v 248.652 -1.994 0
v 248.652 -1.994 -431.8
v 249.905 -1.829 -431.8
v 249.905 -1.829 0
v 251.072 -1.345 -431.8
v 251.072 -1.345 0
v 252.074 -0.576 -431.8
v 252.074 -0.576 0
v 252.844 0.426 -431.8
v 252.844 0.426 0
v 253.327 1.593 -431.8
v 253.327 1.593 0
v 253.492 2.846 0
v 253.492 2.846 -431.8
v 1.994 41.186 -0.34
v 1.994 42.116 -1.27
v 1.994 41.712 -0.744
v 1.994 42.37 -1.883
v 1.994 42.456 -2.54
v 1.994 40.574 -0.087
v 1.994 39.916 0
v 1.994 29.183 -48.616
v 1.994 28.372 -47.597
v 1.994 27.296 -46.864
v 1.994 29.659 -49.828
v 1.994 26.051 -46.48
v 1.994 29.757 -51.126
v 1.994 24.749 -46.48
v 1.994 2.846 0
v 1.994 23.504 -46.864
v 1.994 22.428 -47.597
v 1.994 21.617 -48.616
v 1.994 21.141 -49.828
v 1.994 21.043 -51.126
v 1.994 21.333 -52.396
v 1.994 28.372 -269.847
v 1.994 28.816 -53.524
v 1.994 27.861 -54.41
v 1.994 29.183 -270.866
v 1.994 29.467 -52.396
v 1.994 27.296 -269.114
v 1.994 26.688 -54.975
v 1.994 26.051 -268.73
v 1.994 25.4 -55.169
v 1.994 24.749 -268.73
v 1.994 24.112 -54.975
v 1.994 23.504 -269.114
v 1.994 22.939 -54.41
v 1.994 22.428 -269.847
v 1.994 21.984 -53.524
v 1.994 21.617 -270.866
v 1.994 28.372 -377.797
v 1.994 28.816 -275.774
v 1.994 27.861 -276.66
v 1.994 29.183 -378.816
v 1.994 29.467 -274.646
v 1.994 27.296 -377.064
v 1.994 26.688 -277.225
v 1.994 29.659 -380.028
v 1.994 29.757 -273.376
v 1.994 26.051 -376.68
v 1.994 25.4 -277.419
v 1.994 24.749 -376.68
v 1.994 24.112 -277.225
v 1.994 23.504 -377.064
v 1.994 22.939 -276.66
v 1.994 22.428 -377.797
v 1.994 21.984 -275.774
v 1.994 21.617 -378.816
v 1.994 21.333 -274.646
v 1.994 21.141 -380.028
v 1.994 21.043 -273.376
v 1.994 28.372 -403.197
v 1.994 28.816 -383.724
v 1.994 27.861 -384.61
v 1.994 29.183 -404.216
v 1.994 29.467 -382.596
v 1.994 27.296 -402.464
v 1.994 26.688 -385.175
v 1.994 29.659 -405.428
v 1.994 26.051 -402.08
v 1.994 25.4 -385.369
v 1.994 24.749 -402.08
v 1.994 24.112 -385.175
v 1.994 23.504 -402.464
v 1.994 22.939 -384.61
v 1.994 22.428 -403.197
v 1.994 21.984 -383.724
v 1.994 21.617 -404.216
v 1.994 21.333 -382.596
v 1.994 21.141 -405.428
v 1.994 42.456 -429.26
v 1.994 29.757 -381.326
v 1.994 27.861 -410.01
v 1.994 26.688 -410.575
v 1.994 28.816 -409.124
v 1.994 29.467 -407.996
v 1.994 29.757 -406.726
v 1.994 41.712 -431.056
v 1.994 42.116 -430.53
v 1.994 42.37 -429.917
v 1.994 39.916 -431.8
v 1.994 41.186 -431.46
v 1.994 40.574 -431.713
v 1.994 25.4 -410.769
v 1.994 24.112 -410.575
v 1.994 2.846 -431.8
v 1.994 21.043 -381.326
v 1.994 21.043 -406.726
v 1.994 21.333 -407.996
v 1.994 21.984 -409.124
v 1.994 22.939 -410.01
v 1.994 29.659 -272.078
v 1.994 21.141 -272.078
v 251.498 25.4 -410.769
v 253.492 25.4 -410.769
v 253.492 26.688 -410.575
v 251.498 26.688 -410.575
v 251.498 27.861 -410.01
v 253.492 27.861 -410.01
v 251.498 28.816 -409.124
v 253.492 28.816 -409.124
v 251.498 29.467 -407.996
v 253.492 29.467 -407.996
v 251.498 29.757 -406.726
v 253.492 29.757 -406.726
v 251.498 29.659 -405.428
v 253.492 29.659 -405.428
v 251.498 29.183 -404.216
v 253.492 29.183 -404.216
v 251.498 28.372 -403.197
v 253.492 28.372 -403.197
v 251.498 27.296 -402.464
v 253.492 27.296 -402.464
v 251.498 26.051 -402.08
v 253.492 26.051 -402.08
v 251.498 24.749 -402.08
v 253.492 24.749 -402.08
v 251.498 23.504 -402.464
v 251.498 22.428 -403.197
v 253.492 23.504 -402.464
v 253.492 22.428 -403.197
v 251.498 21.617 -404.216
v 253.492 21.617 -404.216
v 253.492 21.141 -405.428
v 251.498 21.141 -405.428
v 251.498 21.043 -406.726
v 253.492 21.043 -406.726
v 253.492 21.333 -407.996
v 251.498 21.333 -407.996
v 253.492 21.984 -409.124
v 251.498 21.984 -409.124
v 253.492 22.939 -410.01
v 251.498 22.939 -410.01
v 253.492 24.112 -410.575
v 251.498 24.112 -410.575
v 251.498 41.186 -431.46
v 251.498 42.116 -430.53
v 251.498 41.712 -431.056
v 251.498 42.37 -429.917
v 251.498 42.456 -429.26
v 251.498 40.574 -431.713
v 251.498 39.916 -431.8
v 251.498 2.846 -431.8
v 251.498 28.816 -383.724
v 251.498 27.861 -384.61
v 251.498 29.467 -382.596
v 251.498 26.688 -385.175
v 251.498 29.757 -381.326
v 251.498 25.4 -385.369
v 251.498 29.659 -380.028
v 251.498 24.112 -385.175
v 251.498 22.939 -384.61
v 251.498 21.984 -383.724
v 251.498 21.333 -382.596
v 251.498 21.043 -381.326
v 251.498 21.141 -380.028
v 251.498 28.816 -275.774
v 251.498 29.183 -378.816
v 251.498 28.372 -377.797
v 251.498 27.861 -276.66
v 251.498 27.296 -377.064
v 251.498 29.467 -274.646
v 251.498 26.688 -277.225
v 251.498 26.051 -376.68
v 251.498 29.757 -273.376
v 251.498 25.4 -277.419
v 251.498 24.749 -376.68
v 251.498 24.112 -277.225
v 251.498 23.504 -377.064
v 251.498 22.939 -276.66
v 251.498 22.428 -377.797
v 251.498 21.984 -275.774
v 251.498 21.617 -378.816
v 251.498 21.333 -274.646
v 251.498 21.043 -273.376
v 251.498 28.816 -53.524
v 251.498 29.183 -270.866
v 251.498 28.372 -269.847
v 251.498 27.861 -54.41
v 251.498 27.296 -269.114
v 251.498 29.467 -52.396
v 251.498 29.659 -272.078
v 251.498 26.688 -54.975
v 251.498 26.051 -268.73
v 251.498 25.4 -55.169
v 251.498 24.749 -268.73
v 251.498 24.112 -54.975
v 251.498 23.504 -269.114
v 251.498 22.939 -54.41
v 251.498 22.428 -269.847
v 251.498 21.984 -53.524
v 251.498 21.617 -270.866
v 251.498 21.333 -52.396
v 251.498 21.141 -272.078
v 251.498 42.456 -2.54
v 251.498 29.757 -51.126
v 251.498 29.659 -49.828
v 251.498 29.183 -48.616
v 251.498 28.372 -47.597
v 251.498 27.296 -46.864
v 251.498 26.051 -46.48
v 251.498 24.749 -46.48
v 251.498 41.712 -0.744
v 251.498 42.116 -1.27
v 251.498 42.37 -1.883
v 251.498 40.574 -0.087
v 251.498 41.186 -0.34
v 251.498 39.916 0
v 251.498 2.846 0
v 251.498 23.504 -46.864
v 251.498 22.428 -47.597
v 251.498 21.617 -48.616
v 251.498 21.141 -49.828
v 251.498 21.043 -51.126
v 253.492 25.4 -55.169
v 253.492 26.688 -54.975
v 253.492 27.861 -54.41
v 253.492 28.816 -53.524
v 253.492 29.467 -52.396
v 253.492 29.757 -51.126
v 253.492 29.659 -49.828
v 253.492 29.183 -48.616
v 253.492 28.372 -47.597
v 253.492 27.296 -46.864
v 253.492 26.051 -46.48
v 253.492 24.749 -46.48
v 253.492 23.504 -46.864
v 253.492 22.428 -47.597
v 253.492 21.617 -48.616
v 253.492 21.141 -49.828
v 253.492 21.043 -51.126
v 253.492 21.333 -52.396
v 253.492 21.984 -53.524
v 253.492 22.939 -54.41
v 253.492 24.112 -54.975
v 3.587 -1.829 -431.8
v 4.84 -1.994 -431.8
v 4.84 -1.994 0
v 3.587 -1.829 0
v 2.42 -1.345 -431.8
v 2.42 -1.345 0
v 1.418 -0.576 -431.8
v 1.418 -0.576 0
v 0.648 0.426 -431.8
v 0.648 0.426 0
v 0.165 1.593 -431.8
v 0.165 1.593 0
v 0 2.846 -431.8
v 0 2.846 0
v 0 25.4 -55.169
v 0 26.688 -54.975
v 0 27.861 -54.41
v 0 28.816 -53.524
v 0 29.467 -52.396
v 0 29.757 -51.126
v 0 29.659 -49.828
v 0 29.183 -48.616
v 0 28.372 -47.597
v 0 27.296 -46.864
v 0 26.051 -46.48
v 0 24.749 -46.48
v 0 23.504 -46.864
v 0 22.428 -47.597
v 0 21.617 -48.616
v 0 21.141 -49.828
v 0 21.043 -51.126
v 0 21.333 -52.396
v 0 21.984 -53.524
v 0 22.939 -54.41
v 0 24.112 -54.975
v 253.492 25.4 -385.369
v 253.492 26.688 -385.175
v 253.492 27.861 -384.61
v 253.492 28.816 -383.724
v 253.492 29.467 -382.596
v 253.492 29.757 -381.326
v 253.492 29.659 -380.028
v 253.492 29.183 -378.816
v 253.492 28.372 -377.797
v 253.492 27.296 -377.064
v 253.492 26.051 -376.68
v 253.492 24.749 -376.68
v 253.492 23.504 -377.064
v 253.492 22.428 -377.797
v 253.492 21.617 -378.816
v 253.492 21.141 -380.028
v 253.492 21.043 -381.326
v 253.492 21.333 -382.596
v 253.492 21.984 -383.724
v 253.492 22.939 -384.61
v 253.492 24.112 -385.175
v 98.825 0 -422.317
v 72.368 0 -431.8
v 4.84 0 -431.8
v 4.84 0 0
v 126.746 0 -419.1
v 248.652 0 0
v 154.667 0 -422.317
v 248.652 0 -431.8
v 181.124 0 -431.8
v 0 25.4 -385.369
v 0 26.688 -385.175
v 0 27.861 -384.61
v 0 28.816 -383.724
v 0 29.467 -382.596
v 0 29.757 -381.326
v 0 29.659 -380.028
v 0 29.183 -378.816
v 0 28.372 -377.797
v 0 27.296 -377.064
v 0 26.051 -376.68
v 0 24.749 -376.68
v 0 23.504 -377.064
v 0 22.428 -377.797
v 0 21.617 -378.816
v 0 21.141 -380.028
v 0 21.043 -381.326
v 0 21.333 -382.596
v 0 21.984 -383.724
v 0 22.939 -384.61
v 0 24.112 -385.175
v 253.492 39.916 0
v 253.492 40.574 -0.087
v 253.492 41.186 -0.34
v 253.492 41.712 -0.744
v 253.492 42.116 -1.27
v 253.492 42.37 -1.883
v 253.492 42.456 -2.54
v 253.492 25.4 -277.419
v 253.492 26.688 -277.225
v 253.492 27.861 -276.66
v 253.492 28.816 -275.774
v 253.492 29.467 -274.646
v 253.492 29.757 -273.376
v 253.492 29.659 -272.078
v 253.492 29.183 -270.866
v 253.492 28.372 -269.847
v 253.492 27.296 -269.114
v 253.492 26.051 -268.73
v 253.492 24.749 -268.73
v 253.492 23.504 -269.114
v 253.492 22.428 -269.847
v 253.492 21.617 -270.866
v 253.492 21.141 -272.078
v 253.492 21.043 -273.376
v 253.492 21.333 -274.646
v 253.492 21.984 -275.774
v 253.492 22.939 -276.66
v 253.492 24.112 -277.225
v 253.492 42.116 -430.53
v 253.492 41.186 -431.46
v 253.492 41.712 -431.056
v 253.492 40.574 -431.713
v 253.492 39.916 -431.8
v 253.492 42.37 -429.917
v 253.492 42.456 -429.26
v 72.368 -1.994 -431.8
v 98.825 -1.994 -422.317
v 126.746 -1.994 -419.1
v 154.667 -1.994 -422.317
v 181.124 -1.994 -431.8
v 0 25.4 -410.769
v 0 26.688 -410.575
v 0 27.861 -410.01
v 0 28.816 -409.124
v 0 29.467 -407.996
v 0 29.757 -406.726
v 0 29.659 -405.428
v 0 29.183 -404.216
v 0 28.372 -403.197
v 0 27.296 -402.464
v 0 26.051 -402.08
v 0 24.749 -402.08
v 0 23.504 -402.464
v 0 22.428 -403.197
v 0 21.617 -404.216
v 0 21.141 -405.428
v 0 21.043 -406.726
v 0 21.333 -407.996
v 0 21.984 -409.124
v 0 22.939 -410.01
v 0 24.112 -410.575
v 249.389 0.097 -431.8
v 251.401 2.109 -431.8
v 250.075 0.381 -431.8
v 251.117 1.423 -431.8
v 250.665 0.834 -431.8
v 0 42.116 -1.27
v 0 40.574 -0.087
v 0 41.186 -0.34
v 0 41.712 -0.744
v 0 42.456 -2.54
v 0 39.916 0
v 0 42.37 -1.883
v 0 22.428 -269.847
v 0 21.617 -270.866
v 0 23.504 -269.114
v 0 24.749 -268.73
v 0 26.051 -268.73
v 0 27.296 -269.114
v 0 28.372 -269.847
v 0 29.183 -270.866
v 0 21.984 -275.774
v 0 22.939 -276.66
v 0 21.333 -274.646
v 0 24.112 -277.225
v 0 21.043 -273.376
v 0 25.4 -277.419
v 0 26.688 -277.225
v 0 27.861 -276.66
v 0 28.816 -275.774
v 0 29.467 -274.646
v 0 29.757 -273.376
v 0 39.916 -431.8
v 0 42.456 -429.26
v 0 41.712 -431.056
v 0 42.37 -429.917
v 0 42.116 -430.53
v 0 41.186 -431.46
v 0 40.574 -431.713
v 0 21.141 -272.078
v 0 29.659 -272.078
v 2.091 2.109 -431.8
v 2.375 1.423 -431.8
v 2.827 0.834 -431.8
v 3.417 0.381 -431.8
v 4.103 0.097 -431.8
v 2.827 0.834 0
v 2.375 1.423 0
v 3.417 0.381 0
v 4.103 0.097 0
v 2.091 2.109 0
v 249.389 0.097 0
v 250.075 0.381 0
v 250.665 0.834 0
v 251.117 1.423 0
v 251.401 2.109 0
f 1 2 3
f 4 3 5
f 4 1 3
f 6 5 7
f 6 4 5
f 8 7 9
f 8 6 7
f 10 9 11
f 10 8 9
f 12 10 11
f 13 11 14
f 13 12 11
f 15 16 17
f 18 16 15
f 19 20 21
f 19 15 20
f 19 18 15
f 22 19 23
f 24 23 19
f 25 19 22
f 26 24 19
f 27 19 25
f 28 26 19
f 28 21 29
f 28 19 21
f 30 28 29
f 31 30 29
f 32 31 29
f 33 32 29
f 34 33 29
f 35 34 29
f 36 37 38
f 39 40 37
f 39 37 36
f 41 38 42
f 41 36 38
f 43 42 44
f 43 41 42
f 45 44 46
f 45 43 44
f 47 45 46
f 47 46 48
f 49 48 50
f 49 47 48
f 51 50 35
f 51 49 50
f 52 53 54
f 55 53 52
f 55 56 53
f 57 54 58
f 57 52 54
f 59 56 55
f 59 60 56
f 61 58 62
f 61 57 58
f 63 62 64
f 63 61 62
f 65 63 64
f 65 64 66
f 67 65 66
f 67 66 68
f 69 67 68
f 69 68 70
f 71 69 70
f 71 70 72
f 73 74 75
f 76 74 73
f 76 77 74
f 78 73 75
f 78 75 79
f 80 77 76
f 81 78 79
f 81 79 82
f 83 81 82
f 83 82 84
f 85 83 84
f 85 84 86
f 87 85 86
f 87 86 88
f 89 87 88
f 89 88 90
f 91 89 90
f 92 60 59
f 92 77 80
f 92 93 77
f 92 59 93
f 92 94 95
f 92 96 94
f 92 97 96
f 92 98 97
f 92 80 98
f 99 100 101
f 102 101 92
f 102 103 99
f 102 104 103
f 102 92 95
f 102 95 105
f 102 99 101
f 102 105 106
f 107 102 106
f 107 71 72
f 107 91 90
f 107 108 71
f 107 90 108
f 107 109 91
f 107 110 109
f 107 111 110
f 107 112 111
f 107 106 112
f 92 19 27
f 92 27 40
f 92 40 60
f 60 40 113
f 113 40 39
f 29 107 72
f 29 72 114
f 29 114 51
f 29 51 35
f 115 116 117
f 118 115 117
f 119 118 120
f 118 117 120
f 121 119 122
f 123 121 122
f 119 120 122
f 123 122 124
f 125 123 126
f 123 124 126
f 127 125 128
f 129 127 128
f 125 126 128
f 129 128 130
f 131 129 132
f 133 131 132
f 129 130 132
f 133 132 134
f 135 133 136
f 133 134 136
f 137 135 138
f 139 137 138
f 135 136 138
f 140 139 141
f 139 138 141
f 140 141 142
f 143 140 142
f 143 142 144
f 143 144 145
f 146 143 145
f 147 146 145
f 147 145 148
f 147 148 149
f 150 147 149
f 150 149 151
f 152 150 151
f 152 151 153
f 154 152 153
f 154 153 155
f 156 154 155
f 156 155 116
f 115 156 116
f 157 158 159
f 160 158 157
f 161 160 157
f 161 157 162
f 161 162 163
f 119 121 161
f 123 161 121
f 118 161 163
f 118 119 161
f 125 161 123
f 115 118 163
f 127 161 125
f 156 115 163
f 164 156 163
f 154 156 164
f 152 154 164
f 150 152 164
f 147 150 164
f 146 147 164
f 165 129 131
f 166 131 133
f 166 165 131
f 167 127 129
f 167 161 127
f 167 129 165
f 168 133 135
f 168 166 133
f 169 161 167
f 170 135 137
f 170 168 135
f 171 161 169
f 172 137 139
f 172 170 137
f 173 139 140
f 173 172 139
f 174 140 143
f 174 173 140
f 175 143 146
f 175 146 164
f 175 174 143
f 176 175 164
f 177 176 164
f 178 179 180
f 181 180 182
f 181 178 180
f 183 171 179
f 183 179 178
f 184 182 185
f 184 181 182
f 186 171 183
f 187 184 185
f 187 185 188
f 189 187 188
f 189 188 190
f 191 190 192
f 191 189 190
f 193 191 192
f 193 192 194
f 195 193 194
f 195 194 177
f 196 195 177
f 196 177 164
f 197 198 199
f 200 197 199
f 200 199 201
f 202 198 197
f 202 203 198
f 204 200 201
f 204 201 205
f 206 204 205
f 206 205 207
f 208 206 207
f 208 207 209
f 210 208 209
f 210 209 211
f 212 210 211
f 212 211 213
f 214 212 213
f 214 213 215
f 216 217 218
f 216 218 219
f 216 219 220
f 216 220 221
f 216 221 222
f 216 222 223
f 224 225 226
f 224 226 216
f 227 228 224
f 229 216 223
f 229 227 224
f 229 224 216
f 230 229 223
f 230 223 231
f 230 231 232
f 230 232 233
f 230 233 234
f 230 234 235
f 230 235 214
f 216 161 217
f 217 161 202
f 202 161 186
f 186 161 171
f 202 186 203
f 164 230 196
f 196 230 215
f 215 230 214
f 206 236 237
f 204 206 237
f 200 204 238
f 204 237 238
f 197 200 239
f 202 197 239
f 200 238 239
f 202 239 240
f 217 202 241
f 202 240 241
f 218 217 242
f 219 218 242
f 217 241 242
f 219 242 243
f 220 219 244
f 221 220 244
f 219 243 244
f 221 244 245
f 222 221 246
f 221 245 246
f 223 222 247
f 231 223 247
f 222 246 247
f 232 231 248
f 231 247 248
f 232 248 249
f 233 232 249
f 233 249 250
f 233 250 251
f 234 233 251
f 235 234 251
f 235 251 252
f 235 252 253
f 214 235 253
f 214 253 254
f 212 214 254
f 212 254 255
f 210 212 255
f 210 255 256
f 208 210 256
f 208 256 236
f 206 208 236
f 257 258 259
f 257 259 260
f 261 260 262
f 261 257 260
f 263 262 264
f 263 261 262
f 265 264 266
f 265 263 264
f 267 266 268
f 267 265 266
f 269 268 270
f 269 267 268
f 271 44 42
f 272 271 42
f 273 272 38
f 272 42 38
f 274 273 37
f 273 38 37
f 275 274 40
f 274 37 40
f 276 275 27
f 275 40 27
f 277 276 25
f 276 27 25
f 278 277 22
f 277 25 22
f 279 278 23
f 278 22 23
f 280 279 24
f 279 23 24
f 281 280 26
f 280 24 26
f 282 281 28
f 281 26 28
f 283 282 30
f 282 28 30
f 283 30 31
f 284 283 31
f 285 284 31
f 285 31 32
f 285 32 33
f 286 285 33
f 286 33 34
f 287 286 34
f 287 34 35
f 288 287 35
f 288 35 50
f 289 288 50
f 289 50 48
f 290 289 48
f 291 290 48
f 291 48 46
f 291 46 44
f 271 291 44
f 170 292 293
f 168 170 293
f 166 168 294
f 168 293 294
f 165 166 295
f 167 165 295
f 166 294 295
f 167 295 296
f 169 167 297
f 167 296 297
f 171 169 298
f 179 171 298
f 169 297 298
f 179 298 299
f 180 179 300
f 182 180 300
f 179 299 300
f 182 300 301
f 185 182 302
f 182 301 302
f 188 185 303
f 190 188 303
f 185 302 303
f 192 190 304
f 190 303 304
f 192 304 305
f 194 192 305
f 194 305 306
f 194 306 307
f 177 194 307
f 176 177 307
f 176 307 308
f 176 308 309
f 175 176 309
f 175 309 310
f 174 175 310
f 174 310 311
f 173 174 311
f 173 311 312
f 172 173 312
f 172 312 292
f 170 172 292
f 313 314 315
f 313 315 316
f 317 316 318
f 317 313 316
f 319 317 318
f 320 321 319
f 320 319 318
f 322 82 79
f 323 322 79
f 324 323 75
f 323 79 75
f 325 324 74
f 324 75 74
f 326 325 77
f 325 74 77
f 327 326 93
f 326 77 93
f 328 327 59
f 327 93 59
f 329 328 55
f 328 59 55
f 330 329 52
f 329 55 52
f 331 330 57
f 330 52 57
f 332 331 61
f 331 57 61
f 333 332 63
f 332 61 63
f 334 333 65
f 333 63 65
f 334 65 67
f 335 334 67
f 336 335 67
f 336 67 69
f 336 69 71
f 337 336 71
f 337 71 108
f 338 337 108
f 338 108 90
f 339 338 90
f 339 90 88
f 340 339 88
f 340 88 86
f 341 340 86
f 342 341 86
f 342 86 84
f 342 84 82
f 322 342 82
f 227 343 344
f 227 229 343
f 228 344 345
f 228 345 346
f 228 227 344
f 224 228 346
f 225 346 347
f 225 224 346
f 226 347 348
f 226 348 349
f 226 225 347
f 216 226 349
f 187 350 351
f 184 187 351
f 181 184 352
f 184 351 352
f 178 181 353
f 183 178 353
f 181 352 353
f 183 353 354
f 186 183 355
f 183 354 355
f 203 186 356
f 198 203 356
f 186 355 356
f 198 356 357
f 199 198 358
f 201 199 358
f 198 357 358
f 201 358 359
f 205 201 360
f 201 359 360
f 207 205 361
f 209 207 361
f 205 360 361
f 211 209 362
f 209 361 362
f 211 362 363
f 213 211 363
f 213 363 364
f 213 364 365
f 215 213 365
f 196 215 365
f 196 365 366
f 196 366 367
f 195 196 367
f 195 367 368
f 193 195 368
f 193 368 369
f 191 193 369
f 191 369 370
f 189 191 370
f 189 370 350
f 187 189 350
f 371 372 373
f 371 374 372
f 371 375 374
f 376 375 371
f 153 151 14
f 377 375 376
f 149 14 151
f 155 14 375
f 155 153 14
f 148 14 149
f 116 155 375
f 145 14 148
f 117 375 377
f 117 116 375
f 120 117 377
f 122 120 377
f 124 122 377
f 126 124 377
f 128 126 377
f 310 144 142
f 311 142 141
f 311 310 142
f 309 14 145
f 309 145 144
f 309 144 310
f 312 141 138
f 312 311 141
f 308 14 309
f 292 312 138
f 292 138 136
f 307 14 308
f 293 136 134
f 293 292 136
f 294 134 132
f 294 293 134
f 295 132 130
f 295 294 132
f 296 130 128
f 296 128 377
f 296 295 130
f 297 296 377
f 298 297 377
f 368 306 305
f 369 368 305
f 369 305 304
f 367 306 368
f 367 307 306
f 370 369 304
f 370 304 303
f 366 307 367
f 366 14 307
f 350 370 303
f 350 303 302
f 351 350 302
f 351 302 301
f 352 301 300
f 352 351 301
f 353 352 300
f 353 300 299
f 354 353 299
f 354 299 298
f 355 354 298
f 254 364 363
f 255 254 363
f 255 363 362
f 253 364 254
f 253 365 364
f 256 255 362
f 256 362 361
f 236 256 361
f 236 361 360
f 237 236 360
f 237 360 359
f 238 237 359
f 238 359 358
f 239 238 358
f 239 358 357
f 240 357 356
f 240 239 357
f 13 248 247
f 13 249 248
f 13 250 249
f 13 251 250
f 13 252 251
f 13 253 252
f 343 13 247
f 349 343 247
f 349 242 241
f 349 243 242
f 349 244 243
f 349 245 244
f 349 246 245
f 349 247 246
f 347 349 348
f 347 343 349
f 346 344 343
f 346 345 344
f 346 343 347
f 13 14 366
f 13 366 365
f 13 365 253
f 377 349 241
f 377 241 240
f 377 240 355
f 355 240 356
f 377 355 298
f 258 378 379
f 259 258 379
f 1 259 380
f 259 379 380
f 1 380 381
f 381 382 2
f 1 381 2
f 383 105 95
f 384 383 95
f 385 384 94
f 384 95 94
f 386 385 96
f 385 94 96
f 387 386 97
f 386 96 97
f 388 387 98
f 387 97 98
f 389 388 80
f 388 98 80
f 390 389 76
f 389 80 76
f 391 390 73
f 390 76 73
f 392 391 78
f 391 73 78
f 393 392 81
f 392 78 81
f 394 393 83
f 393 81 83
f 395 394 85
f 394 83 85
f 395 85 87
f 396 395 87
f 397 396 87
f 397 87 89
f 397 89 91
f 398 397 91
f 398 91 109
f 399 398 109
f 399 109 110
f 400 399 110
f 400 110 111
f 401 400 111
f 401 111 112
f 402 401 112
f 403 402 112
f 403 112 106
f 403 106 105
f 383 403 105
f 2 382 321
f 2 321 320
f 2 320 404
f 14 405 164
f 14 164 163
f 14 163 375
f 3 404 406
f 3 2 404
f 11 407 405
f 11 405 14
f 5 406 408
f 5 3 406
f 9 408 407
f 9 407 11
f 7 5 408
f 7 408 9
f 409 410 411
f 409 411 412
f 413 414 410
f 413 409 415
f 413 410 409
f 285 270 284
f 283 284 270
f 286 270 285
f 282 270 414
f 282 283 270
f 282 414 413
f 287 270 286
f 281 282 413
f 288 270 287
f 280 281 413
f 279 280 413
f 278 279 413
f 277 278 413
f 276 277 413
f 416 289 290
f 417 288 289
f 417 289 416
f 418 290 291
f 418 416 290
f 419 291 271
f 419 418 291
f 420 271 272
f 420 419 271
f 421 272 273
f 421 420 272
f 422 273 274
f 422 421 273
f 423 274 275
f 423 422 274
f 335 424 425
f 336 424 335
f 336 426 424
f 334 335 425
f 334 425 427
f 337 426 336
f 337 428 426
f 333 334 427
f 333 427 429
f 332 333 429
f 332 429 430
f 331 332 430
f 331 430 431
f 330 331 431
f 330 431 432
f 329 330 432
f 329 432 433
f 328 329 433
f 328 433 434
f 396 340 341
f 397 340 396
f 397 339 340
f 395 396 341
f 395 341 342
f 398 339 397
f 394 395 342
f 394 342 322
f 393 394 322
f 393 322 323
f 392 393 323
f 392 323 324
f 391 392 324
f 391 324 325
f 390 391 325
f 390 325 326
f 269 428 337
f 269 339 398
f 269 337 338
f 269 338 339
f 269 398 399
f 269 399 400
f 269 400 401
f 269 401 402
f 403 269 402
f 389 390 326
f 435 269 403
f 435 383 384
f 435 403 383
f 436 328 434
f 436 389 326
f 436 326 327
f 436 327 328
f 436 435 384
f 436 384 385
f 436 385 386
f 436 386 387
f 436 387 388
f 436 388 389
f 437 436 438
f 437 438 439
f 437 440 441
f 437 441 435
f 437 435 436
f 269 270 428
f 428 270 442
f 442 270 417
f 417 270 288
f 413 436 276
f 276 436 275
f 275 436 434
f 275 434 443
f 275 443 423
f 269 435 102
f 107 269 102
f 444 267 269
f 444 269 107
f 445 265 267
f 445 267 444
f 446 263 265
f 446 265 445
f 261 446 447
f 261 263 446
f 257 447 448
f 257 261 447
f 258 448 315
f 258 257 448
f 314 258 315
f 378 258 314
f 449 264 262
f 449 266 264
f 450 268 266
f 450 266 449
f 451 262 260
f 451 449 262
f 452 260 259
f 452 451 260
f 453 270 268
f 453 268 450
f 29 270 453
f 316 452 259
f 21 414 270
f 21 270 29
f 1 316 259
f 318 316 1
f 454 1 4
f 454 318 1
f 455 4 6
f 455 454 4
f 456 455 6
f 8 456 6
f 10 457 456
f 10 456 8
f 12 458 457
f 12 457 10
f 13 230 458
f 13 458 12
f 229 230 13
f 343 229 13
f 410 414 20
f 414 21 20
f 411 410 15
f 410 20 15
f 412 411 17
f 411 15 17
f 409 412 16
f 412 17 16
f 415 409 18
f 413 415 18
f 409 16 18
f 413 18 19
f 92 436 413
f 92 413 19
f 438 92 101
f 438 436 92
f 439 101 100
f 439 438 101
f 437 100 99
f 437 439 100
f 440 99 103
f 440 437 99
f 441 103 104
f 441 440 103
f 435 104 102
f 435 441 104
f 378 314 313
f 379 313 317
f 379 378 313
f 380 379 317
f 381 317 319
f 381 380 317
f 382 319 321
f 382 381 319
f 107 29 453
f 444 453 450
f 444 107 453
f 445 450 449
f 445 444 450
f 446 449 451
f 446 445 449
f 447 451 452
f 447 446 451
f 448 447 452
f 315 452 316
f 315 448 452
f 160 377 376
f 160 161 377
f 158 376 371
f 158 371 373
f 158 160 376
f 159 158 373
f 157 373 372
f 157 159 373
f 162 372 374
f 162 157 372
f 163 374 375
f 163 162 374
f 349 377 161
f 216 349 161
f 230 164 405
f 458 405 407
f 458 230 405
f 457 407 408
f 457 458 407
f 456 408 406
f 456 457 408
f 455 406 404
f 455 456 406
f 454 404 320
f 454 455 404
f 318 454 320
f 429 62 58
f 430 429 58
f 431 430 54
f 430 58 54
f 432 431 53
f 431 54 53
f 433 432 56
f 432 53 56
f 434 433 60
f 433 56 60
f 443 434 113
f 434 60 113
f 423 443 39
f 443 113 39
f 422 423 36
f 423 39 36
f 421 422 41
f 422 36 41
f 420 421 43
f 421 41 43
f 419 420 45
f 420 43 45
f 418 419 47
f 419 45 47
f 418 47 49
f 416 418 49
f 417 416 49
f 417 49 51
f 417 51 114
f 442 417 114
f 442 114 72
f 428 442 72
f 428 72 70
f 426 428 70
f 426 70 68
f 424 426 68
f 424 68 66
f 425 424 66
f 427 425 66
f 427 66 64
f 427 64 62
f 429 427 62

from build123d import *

# Parameters (mm, degrees)
SKETCH1_W                                 = 253.492
SKETCH1_H                                 = 457.2
BASE_FLANGE1_DEPTH                        = 1.9939
EDGE_FLANGE1_STRIP_W                      = 13.66774
EDGE_FLANGE1_STRIP_H                      = 1.9939
EDGE_FLANGE1_STRIP_CUT_DEPTH              = 457.2
EDGE_FLANGE1_STRIP_2_W                    = 13.66774
EDGE_FLANGE1_STRIP_2_H                    = 1.9939
EDGE_FLANGE1_STRIP_CUT_2_DEPTH            = 457.2
EDGE_FLANGE1_DEPTH                        = 457.2
EDGE_FLANGE1_BEND_DEPTH                   = 457.2
HOLE_FOR_1_4_SELF_CLINCHING_NUTS_S_SS_C_D = 8.7376
CUT_EXTRUDE1_DEPTH                        = 525.657828078
SKETCH16_W                                = 253.492
SKETCH16_H                                = 25.4
CUT_EXTRUDE2_DEPTH                        = 525.657828078
FILLET1_R                                 = 2.54


# Sheet-metal steps are written as plain solids
with BuildPart() as part:
    # Sketch1 → Base-Flange1 (new body)
    with BuildSketch(Plane(origin=(0, 0, 0), x_dir=(1, 0, 0), z_dir=(0, 1, 0))):
        with Locations((126.746, 228.6)):
            Rectangle(SKETCH1_W, SKETCH1_H)
    extrude(amount=-BASE_FLANGE1_DEPTH)

    # Edge-Flange1 strip (across the edge) → Edge-Flange1 strip cut (cut)
    with BuildSketch(Plane.XY.offset(-457.2)):
        with Locations((-1.9939, -0.99695)):
            Rectangle(EDGE_FLANGE1_STRIP_W, EDGE_FLANGE1_STRIP_H)
    extrude(amount=EDGE_FLANGE1_STRIP_CUT_DEPTH, mode=Mode.SUBTRACT)

    # Edge-Flange1 strip 2 (across the edge) → Edge-Flange1 strip cut 2 (cut)
    with BuildSketch(Plane(origin=(253.492, 0, 0), x_dir=(-1, 0, 0), z_dir=(0, 0, -1))):
        with Locations((-1.9939, -0.99695)):
            Rectangle(EDGE_FLANGE1_STRIP_2_W, EDGE_FLANGE1_STRIP_2_H)
    extrude(amount=EDGE_FLANGE1_STRIP_CUT_2_DEPTH, mode=Mode.SUBTRACT)

    # Edge-Flange1 section (across the edge) → Edge-Flange1 (add)
    with BuildSketch(Plane.XY.offset(-457.2)):
        with BuildLine():
            Line((0, 2.84607), (0, 42.4561))
            Line((0, 42.4561), (1.9939, 42.4561))
            Line((1.9939, 42.4561), (1.9939, 2.84607))
            ThreePointArc((1.9939, 2.84607), (2.827494603, 0.833594603), (4.83997, 0))
            Line((4.83997, 0), (4.83997, -1.9939))
            ThreePointArc((4.83997, -1.9939), (1.417594392, -0.576305608), (0, 2.84607))
        make_face()
    extrude(amount=EDGE_FLANGE1_DEPTH)

    # Edge-Flange1 section 2 (across the edge) → Edge-Flange1 bend (add)
    with BuildSketch(Plane(origin=(253.492, 0, 0), x_dir=(-1, 0, 0), z_dir=(0, 0, -1))):
        with BuildLine():
            Line((0, 2.84607), (0, 42.4561))
            Line((0, 42.4561), (1.9939, 42.4561))
            Line((1.9939, 42.4561), (1.9939, 2.84607))
            ThreePointArc((1.9939, 2.84607), (2.827494603, 0.833594603), (4.83997, 0))
            Line((4.83997, 0), (4.83997, -1.9939))
            ThreePointArc((4.83997, -1.9939), (1.417594392, -0.576305608), (0, 2.84607))
        make_face()
    extrude(amount=EDGE_FLANGE1_BEND_DEPTH)

    # Hole for 1/4 Self-clinching Nuts (S,SS,CLS,CLSS)1 (through all)
    with Locations(Plane.ZY):
        with Locations((-406.4, 25.4), (-50.8, 25.4), (-381, 25.4), (-273.05, 25.4)):
            Hole(HOLE_FOR_1_4_SELF_CLINCHING_NUTS_S_SS_C_D / 2)

    # Sketch15 → Cut-Extrude1 (cut, through all)
    with BuildSketch(Plane.XZ.offset(1.9939)):
        with BuildLine():
            Line((215.646, -457.2), (37.846, -457.2))
            ThreePointArc((37.846, -457.2), (126.746, -419.1), (215.646, -457.2))
        make_face()
    extrude(amount=-CUT_EXTRUDE1_DEPTH, mode=Mode.SUBTRACT)

    # Sketch16 → Cut-Extrude2 (cut, through all)
    with BuildSketch(Plane.XZ.offset(1.9939)):
        with Locations((126.746, -444.5)):
            Rectangle(SKETCH16_W, SKETCH16_H)
    extrude(amount=-CUT_EXTRUDE2_DEPTH, mode=Mode.SUBTRACT)

    # Fillet1
    fillet1_edges = [part.edges().sort_by_distance(p)[0] for p in [
        (0.99695, 42.4561, -431.8),
        (252.49505, 42.4561, -431.8),
        (0.99695, 42.4561, 0),
        (252.49505, 42.4561, 0),
    ]]
    fillet(fillet1_edges, radius=FILLET1_R)


solid = part.part
